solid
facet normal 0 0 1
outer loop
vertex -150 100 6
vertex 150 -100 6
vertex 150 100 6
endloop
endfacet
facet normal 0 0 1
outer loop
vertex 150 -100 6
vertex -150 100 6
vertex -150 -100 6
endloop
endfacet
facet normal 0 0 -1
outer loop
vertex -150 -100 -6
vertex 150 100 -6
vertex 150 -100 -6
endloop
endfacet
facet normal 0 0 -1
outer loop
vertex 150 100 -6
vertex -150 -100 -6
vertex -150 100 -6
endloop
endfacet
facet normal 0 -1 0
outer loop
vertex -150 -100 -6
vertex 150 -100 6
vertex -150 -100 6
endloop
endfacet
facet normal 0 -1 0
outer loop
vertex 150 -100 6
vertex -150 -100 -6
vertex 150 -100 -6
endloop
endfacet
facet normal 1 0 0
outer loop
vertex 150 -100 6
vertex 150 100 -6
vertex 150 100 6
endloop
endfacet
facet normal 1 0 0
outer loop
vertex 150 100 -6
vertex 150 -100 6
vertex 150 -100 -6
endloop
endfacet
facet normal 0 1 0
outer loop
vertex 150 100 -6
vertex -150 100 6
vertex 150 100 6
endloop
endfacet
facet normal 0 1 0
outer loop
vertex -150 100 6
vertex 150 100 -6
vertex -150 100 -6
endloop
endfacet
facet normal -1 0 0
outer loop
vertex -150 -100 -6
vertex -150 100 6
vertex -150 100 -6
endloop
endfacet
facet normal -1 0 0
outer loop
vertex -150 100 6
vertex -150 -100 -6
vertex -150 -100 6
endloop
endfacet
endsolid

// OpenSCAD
// Aluminium tooling plate sheet (no holes, no labels)

// Parameters
plate_length    = 300;   //[150:600:1]
plate_width     = 200;   //[100:400:1]
plate_thickness = 12;    //[6:24:1]

// Optional edge treatment
corner_chamfer_leg = 0;  //[0:6:1]

eps = 0.01;

// Base plate
module tooling_plate_body() {
  cube([plate_length, plate_width, plate_thickness], center=true);
}

// Corner chamfer cutter (triangular prism) positioned to remove material at each corner
module corner_chamfer_cut() {
  // Extrude along Z, centered, so it fully spans the plate thickness
  linear_extrude(height=plate_thickness + 2*eps, center=true)
    polygon(points=[[0,0],[corner_chamfer_leg,0],[0,corner_chamfer_leg]]);
}

module corner_chamfers() {
  // Place each cutter so its right-angle vertex sits exactly at the plate corner.
  // Use formulas derived from plate dimensions; no arbitrary offsets.
  translate([ plate_length/2 - corner_chamfer_leg,  plate_width/2 - corner_chamfer_leg, 0])
    corner_chamfer_cut();

  translate([-plate_length/2 + corner_chamfer_leg,  plate_width/2 - corner_chamfer_leg, 0])
    rotate([0,0, 90]) corner_chamfer_cut();

  translate([-plate_length/2 + corner_chamfer_leg, -plate_width/2 + corner_chamfer_leg, 0])
    rotate([0,0,180]) corner_chamfer_cut();

  translate([ plate_length/2 - corner_chamfer_leg, -plate_width/2 + corner_chamfer_leg, 0])
    rotate([0,0,-90]) corner_chamfer_cut();
}

// Final model: one connected solid
color([0.78, 0.78, 0.80])  // aluminium-like silver/grey
difference() {
  tooling_plate_body();
  if (corner_chamfer_leg > 0)
    corner_chamfers();
}
